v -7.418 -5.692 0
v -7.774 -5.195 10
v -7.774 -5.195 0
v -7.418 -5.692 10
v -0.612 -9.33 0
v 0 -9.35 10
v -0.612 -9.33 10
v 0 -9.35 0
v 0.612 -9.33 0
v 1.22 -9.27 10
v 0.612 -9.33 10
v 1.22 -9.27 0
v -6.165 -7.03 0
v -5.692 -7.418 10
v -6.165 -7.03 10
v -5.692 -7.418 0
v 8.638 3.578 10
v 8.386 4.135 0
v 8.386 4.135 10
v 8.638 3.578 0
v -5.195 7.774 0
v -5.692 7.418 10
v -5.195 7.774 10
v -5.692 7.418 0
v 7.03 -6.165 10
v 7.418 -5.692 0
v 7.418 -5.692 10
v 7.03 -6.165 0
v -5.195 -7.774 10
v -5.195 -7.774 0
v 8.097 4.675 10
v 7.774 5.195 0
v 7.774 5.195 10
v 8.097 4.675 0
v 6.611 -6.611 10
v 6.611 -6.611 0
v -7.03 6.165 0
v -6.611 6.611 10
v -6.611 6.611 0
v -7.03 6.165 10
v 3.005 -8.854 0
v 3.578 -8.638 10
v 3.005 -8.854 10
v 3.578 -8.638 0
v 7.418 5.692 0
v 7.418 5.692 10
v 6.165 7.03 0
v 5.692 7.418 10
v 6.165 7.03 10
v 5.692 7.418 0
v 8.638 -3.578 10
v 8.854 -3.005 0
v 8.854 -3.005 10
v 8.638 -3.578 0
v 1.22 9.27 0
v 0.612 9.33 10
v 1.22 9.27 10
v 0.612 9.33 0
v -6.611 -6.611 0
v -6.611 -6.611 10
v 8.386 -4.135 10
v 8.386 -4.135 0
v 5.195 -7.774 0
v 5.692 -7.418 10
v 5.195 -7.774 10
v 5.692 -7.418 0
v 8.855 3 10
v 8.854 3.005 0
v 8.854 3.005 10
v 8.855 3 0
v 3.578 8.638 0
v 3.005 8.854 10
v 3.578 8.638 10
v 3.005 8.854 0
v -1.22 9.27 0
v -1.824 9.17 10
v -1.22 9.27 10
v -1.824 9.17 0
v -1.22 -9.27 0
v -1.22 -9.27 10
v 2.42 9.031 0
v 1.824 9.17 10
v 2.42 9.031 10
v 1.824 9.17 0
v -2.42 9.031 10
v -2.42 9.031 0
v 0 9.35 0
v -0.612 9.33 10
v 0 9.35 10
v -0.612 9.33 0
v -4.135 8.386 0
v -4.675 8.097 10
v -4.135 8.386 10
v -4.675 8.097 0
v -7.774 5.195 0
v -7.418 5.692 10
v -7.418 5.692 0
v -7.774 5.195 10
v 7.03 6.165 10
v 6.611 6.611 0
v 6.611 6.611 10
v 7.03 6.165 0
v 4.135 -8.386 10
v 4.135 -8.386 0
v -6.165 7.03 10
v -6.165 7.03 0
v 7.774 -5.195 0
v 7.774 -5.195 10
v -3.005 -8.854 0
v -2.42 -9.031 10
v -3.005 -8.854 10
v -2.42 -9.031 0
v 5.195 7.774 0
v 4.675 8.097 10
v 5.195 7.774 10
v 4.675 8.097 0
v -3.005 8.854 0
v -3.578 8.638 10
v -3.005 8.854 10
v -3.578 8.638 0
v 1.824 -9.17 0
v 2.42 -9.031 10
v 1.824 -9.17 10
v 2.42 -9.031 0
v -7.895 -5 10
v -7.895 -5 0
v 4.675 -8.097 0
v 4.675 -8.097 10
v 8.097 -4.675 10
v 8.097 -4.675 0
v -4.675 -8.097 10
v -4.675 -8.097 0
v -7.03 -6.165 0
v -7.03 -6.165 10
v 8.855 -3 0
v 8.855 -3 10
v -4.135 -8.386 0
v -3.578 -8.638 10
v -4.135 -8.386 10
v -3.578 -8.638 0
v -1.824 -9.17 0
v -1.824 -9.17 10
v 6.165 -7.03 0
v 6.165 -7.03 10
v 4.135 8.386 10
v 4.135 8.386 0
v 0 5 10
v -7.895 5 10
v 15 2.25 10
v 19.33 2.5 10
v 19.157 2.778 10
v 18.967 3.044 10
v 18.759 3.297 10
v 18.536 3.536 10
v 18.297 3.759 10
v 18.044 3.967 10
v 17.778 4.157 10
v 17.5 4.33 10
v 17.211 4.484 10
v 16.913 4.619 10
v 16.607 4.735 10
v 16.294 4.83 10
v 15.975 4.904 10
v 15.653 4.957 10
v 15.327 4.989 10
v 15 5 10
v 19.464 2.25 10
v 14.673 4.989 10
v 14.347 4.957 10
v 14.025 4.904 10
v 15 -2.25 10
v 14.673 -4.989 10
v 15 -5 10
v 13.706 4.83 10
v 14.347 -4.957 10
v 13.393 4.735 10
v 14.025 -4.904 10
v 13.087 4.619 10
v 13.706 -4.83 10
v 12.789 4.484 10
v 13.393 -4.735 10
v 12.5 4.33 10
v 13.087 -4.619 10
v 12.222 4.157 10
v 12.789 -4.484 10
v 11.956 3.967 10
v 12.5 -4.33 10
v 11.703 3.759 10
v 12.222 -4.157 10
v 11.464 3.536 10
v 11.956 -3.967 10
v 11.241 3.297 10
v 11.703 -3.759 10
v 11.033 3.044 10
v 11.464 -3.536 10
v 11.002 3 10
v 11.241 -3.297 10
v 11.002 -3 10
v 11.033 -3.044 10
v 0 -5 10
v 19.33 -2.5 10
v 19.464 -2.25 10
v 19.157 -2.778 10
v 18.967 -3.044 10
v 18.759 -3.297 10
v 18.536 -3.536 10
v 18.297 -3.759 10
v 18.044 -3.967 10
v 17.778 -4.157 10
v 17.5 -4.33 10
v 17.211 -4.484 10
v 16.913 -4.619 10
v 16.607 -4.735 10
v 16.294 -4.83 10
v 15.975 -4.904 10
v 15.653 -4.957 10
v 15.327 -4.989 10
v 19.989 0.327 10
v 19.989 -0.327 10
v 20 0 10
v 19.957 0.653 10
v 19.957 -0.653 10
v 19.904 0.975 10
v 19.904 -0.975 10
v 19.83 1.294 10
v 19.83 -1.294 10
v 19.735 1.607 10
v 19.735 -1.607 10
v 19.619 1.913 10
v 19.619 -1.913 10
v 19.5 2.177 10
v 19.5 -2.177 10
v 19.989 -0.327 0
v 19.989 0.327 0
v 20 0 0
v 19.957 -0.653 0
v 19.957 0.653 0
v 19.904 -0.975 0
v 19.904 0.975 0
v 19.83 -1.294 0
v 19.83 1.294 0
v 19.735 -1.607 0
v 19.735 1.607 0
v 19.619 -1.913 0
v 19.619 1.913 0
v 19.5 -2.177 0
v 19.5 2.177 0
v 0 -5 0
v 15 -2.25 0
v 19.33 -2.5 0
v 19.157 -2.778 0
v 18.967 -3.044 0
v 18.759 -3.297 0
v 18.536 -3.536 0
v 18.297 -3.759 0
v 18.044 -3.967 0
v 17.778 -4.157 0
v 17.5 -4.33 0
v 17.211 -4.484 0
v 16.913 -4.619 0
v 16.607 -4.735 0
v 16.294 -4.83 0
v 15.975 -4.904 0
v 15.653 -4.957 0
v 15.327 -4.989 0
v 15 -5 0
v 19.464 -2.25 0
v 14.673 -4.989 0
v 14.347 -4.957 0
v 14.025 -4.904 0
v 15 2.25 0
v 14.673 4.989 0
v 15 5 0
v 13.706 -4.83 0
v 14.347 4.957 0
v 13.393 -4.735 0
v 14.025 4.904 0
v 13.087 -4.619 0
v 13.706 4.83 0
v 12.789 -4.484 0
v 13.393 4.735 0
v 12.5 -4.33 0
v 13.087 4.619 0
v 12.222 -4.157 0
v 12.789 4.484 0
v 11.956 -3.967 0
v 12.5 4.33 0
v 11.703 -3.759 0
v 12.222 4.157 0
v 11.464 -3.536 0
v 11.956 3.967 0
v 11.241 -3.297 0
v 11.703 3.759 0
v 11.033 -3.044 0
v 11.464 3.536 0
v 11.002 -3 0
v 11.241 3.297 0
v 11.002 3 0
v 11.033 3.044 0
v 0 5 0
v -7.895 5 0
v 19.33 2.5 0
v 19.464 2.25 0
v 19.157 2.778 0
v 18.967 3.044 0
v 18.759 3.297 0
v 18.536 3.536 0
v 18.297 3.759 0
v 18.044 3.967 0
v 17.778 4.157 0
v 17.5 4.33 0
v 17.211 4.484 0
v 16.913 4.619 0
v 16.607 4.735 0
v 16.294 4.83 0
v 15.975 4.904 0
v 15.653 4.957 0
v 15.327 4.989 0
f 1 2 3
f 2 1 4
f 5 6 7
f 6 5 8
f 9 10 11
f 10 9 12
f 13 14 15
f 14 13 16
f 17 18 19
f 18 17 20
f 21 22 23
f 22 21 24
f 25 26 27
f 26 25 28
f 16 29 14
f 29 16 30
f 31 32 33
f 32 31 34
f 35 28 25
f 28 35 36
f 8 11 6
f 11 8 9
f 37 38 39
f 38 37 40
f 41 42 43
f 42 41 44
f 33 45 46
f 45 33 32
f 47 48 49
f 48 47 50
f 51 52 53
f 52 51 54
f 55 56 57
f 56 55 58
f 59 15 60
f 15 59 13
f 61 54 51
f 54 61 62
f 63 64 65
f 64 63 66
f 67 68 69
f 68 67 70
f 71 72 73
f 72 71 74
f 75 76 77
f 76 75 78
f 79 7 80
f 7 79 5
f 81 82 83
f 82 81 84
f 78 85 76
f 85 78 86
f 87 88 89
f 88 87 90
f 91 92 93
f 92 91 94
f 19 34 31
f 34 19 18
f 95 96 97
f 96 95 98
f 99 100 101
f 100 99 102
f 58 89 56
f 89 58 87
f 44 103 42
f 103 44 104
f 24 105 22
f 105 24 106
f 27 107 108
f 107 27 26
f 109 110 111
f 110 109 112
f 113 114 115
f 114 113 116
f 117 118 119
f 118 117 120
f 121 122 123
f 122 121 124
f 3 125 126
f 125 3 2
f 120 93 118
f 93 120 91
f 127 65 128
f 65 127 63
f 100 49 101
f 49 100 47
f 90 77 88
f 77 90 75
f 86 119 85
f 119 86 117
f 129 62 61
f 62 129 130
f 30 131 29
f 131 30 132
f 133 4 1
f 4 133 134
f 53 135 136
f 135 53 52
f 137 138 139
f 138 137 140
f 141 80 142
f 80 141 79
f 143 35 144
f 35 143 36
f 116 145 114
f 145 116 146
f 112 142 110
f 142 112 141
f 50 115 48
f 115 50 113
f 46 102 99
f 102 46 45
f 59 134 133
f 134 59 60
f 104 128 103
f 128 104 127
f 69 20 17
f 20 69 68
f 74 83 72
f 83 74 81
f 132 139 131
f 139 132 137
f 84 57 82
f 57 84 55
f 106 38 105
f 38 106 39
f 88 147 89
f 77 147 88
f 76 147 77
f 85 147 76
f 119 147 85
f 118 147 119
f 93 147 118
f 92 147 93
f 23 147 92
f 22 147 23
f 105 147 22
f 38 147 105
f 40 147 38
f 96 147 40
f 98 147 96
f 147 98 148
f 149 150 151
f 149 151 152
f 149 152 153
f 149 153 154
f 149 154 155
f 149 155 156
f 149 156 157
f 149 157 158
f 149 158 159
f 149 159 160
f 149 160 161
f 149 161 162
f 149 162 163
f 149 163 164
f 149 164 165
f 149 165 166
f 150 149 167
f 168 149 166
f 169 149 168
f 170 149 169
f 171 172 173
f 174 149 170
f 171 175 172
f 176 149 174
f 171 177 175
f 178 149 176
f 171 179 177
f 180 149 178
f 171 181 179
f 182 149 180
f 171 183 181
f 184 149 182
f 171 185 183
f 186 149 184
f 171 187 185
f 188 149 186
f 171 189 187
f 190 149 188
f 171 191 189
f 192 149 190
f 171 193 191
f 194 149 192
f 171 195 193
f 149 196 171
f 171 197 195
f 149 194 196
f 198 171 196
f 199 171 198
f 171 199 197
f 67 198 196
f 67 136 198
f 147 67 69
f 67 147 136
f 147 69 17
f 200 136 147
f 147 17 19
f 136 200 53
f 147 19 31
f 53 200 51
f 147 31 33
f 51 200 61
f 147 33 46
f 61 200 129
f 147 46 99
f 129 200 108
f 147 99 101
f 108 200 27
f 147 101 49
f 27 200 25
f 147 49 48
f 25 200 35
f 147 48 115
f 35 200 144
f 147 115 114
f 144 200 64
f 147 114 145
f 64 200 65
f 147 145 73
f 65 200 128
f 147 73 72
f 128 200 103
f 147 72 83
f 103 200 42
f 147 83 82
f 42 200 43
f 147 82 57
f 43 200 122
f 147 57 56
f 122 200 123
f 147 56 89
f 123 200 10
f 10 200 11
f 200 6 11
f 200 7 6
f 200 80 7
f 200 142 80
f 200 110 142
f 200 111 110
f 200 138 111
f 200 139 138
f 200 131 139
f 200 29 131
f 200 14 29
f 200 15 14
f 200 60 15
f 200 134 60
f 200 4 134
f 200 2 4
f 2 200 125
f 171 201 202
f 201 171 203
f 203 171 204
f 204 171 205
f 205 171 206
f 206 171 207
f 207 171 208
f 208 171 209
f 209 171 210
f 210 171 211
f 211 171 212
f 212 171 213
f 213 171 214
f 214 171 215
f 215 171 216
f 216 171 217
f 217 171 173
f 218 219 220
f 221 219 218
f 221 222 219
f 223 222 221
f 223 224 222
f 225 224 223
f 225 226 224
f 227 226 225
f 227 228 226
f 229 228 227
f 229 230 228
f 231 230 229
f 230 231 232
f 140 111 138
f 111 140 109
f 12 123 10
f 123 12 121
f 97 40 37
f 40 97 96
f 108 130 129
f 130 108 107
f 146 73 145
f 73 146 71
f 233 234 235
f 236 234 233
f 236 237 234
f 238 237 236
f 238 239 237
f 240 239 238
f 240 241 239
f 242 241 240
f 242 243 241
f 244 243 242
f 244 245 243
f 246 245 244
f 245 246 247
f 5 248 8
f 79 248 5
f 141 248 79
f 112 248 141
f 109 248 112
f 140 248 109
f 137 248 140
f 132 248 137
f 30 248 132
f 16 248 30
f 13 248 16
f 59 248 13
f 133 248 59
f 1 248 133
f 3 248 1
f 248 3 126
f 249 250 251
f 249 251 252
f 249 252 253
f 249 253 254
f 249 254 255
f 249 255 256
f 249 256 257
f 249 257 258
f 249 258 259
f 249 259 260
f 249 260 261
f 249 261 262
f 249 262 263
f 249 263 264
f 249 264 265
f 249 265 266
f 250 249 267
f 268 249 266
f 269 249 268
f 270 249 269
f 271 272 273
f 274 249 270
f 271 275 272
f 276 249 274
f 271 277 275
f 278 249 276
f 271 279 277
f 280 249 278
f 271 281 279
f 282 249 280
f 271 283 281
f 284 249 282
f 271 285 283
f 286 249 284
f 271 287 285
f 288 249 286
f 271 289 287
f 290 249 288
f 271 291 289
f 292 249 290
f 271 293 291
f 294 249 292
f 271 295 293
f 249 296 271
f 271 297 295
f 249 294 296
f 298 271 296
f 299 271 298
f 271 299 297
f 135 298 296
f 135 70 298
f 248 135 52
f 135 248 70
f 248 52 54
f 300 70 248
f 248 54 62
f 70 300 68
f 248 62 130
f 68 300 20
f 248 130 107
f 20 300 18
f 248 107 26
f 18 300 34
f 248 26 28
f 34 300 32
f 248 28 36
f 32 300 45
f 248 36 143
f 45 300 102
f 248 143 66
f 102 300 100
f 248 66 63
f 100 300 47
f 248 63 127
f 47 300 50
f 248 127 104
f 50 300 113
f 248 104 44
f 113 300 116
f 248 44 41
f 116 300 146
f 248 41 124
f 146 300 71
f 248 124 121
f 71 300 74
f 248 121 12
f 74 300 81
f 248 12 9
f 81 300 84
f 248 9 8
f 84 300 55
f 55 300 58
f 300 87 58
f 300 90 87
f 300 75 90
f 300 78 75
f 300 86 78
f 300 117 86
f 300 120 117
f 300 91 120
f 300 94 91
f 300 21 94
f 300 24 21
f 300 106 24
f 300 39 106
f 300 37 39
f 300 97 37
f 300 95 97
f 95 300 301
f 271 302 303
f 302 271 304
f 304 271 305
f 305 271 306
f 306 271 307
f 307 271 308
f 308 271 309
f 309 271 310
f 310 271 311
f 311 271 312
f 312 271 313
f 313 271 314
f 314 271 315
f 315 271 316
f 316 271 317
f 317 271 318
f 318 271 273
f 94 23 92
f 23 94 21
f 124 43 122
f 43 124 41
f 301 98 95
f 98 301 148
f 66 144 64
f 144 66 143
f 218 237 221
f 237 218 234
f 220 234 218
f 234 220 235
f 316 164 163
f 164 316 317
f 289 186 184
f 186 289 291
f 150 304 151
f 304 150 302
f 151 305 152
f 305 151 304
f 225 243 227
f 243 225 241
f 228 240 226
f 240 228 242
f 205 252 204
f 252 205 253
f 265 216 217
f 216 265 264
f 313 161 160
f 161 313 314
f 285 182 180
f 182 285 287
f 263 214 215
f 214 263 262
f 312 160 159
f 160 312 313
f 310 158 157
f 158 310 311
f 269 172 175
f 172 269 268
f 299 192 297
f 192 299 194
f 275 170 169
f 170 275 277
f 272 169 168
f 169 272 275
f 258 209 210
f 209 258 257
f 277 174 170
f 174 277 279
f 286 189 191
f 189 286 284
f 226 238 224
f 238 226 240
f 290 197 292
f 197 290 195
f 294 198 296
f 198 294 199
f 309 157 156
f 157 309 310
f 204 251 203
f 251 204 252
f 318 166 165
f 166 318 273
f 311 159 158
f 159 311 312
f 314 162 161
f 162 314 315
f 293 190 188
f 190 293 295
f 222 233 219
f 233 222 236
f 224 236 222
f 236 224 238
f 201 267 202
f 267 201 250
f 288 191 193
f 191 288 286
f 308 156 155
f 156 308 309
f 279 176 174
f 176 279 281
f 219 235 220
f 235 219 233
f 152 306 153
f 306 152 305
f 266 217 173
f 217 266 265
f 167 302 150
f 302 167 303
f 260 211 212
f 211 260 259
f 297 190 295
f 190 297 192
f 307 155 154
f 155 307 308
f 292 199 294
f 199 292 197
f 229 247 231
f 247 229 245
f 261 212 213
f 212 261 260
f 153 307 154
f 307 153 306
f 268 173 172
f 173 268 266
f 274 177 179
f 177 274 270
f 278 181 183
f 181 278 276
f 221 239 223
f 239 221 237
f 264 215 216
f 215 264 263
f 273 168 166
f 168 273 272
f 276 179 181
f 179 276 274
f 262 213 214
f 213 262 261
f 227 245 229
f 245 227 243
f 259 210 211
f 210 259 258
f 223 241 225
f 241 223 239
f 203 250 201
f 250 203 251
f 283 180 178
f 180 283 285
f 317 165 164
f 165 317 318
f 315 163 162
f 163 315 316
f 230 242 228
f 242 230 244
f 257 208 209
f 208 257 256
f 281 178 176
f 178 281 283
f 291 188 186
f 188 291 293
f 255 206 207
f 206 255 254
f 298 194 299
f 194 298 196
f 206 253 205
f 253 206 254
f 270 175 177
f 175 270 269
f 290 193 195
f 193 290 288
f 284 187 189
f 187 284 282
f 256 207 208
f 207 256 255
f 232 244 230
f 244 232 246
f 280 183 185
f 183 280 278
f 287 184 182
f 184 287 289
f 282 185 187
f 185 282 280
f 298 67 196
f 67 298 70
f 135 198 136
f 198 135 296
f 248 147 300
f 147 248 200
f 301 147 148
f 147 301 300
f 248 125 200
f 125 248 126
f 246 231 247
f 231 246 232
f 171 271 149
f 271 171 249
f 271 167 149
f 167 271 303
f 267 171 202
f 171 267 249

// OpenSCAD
// Tubing clip for 12.7 mm lab stand rod
// Print orientation: flat on bed, extrusion along +Z

$fn = 96;

// ---- Dimensions (mm) ----
rod_d      = 12.7;   // rod diameter
ring_w     = 3;      // rod ring wall
rod_od     = rod_d + 2*ring_w; // rod ring outer diameter (18.7)
opening_w  = 10;     // rod ring opening width
rod_x      = 0;      // rod ring centre X
rod_y      = 0;      // rod ring centre Y

tub_d      = 6;      // tubing inner diameter
tub_w      = 2;      // tubing wall
tub_od     = tub_d + 2*tub_w; // tubing outer diameter (10)
tub_open   = 4.5;    // tubing opening width
tub_x      = 15;     // tubing ring centre X
tub_y      = 0;      // tubing ring centre Y

bridge_x1  = 8;      // bridge start X
bridge_x2  = 12;     // bridge end X
bridge_w   = 6;      // bridge width (Y)

h          = 10;     // extrusion height
eps        = 0.5;    // cut overshoot

// ---- Model ----
difference() {
    union() {
        // Rod ring
        cylinder(d = rod_od, h = h);
        // Tubing ring
        translate([tub_x, tub_y, 0])
            cylinder(d = tub_od, h = h);
        // Bridge
        translate([bridge_x1, -bridge_w/2, 0])
            cube([bridge_x2 - bridge_x1, bridge_w, h]);
    }
    // Rod opening
    translate([rod_x - opening_w, -opening_w/2, -eps])
        cube([opening_w, opening_w, h + 2*eps]);
    // Tubing opening
    translate([tub_x, -tub_open/2, -eps])
        cube([tub_open, tub_open, h + 2*eps]);
}
